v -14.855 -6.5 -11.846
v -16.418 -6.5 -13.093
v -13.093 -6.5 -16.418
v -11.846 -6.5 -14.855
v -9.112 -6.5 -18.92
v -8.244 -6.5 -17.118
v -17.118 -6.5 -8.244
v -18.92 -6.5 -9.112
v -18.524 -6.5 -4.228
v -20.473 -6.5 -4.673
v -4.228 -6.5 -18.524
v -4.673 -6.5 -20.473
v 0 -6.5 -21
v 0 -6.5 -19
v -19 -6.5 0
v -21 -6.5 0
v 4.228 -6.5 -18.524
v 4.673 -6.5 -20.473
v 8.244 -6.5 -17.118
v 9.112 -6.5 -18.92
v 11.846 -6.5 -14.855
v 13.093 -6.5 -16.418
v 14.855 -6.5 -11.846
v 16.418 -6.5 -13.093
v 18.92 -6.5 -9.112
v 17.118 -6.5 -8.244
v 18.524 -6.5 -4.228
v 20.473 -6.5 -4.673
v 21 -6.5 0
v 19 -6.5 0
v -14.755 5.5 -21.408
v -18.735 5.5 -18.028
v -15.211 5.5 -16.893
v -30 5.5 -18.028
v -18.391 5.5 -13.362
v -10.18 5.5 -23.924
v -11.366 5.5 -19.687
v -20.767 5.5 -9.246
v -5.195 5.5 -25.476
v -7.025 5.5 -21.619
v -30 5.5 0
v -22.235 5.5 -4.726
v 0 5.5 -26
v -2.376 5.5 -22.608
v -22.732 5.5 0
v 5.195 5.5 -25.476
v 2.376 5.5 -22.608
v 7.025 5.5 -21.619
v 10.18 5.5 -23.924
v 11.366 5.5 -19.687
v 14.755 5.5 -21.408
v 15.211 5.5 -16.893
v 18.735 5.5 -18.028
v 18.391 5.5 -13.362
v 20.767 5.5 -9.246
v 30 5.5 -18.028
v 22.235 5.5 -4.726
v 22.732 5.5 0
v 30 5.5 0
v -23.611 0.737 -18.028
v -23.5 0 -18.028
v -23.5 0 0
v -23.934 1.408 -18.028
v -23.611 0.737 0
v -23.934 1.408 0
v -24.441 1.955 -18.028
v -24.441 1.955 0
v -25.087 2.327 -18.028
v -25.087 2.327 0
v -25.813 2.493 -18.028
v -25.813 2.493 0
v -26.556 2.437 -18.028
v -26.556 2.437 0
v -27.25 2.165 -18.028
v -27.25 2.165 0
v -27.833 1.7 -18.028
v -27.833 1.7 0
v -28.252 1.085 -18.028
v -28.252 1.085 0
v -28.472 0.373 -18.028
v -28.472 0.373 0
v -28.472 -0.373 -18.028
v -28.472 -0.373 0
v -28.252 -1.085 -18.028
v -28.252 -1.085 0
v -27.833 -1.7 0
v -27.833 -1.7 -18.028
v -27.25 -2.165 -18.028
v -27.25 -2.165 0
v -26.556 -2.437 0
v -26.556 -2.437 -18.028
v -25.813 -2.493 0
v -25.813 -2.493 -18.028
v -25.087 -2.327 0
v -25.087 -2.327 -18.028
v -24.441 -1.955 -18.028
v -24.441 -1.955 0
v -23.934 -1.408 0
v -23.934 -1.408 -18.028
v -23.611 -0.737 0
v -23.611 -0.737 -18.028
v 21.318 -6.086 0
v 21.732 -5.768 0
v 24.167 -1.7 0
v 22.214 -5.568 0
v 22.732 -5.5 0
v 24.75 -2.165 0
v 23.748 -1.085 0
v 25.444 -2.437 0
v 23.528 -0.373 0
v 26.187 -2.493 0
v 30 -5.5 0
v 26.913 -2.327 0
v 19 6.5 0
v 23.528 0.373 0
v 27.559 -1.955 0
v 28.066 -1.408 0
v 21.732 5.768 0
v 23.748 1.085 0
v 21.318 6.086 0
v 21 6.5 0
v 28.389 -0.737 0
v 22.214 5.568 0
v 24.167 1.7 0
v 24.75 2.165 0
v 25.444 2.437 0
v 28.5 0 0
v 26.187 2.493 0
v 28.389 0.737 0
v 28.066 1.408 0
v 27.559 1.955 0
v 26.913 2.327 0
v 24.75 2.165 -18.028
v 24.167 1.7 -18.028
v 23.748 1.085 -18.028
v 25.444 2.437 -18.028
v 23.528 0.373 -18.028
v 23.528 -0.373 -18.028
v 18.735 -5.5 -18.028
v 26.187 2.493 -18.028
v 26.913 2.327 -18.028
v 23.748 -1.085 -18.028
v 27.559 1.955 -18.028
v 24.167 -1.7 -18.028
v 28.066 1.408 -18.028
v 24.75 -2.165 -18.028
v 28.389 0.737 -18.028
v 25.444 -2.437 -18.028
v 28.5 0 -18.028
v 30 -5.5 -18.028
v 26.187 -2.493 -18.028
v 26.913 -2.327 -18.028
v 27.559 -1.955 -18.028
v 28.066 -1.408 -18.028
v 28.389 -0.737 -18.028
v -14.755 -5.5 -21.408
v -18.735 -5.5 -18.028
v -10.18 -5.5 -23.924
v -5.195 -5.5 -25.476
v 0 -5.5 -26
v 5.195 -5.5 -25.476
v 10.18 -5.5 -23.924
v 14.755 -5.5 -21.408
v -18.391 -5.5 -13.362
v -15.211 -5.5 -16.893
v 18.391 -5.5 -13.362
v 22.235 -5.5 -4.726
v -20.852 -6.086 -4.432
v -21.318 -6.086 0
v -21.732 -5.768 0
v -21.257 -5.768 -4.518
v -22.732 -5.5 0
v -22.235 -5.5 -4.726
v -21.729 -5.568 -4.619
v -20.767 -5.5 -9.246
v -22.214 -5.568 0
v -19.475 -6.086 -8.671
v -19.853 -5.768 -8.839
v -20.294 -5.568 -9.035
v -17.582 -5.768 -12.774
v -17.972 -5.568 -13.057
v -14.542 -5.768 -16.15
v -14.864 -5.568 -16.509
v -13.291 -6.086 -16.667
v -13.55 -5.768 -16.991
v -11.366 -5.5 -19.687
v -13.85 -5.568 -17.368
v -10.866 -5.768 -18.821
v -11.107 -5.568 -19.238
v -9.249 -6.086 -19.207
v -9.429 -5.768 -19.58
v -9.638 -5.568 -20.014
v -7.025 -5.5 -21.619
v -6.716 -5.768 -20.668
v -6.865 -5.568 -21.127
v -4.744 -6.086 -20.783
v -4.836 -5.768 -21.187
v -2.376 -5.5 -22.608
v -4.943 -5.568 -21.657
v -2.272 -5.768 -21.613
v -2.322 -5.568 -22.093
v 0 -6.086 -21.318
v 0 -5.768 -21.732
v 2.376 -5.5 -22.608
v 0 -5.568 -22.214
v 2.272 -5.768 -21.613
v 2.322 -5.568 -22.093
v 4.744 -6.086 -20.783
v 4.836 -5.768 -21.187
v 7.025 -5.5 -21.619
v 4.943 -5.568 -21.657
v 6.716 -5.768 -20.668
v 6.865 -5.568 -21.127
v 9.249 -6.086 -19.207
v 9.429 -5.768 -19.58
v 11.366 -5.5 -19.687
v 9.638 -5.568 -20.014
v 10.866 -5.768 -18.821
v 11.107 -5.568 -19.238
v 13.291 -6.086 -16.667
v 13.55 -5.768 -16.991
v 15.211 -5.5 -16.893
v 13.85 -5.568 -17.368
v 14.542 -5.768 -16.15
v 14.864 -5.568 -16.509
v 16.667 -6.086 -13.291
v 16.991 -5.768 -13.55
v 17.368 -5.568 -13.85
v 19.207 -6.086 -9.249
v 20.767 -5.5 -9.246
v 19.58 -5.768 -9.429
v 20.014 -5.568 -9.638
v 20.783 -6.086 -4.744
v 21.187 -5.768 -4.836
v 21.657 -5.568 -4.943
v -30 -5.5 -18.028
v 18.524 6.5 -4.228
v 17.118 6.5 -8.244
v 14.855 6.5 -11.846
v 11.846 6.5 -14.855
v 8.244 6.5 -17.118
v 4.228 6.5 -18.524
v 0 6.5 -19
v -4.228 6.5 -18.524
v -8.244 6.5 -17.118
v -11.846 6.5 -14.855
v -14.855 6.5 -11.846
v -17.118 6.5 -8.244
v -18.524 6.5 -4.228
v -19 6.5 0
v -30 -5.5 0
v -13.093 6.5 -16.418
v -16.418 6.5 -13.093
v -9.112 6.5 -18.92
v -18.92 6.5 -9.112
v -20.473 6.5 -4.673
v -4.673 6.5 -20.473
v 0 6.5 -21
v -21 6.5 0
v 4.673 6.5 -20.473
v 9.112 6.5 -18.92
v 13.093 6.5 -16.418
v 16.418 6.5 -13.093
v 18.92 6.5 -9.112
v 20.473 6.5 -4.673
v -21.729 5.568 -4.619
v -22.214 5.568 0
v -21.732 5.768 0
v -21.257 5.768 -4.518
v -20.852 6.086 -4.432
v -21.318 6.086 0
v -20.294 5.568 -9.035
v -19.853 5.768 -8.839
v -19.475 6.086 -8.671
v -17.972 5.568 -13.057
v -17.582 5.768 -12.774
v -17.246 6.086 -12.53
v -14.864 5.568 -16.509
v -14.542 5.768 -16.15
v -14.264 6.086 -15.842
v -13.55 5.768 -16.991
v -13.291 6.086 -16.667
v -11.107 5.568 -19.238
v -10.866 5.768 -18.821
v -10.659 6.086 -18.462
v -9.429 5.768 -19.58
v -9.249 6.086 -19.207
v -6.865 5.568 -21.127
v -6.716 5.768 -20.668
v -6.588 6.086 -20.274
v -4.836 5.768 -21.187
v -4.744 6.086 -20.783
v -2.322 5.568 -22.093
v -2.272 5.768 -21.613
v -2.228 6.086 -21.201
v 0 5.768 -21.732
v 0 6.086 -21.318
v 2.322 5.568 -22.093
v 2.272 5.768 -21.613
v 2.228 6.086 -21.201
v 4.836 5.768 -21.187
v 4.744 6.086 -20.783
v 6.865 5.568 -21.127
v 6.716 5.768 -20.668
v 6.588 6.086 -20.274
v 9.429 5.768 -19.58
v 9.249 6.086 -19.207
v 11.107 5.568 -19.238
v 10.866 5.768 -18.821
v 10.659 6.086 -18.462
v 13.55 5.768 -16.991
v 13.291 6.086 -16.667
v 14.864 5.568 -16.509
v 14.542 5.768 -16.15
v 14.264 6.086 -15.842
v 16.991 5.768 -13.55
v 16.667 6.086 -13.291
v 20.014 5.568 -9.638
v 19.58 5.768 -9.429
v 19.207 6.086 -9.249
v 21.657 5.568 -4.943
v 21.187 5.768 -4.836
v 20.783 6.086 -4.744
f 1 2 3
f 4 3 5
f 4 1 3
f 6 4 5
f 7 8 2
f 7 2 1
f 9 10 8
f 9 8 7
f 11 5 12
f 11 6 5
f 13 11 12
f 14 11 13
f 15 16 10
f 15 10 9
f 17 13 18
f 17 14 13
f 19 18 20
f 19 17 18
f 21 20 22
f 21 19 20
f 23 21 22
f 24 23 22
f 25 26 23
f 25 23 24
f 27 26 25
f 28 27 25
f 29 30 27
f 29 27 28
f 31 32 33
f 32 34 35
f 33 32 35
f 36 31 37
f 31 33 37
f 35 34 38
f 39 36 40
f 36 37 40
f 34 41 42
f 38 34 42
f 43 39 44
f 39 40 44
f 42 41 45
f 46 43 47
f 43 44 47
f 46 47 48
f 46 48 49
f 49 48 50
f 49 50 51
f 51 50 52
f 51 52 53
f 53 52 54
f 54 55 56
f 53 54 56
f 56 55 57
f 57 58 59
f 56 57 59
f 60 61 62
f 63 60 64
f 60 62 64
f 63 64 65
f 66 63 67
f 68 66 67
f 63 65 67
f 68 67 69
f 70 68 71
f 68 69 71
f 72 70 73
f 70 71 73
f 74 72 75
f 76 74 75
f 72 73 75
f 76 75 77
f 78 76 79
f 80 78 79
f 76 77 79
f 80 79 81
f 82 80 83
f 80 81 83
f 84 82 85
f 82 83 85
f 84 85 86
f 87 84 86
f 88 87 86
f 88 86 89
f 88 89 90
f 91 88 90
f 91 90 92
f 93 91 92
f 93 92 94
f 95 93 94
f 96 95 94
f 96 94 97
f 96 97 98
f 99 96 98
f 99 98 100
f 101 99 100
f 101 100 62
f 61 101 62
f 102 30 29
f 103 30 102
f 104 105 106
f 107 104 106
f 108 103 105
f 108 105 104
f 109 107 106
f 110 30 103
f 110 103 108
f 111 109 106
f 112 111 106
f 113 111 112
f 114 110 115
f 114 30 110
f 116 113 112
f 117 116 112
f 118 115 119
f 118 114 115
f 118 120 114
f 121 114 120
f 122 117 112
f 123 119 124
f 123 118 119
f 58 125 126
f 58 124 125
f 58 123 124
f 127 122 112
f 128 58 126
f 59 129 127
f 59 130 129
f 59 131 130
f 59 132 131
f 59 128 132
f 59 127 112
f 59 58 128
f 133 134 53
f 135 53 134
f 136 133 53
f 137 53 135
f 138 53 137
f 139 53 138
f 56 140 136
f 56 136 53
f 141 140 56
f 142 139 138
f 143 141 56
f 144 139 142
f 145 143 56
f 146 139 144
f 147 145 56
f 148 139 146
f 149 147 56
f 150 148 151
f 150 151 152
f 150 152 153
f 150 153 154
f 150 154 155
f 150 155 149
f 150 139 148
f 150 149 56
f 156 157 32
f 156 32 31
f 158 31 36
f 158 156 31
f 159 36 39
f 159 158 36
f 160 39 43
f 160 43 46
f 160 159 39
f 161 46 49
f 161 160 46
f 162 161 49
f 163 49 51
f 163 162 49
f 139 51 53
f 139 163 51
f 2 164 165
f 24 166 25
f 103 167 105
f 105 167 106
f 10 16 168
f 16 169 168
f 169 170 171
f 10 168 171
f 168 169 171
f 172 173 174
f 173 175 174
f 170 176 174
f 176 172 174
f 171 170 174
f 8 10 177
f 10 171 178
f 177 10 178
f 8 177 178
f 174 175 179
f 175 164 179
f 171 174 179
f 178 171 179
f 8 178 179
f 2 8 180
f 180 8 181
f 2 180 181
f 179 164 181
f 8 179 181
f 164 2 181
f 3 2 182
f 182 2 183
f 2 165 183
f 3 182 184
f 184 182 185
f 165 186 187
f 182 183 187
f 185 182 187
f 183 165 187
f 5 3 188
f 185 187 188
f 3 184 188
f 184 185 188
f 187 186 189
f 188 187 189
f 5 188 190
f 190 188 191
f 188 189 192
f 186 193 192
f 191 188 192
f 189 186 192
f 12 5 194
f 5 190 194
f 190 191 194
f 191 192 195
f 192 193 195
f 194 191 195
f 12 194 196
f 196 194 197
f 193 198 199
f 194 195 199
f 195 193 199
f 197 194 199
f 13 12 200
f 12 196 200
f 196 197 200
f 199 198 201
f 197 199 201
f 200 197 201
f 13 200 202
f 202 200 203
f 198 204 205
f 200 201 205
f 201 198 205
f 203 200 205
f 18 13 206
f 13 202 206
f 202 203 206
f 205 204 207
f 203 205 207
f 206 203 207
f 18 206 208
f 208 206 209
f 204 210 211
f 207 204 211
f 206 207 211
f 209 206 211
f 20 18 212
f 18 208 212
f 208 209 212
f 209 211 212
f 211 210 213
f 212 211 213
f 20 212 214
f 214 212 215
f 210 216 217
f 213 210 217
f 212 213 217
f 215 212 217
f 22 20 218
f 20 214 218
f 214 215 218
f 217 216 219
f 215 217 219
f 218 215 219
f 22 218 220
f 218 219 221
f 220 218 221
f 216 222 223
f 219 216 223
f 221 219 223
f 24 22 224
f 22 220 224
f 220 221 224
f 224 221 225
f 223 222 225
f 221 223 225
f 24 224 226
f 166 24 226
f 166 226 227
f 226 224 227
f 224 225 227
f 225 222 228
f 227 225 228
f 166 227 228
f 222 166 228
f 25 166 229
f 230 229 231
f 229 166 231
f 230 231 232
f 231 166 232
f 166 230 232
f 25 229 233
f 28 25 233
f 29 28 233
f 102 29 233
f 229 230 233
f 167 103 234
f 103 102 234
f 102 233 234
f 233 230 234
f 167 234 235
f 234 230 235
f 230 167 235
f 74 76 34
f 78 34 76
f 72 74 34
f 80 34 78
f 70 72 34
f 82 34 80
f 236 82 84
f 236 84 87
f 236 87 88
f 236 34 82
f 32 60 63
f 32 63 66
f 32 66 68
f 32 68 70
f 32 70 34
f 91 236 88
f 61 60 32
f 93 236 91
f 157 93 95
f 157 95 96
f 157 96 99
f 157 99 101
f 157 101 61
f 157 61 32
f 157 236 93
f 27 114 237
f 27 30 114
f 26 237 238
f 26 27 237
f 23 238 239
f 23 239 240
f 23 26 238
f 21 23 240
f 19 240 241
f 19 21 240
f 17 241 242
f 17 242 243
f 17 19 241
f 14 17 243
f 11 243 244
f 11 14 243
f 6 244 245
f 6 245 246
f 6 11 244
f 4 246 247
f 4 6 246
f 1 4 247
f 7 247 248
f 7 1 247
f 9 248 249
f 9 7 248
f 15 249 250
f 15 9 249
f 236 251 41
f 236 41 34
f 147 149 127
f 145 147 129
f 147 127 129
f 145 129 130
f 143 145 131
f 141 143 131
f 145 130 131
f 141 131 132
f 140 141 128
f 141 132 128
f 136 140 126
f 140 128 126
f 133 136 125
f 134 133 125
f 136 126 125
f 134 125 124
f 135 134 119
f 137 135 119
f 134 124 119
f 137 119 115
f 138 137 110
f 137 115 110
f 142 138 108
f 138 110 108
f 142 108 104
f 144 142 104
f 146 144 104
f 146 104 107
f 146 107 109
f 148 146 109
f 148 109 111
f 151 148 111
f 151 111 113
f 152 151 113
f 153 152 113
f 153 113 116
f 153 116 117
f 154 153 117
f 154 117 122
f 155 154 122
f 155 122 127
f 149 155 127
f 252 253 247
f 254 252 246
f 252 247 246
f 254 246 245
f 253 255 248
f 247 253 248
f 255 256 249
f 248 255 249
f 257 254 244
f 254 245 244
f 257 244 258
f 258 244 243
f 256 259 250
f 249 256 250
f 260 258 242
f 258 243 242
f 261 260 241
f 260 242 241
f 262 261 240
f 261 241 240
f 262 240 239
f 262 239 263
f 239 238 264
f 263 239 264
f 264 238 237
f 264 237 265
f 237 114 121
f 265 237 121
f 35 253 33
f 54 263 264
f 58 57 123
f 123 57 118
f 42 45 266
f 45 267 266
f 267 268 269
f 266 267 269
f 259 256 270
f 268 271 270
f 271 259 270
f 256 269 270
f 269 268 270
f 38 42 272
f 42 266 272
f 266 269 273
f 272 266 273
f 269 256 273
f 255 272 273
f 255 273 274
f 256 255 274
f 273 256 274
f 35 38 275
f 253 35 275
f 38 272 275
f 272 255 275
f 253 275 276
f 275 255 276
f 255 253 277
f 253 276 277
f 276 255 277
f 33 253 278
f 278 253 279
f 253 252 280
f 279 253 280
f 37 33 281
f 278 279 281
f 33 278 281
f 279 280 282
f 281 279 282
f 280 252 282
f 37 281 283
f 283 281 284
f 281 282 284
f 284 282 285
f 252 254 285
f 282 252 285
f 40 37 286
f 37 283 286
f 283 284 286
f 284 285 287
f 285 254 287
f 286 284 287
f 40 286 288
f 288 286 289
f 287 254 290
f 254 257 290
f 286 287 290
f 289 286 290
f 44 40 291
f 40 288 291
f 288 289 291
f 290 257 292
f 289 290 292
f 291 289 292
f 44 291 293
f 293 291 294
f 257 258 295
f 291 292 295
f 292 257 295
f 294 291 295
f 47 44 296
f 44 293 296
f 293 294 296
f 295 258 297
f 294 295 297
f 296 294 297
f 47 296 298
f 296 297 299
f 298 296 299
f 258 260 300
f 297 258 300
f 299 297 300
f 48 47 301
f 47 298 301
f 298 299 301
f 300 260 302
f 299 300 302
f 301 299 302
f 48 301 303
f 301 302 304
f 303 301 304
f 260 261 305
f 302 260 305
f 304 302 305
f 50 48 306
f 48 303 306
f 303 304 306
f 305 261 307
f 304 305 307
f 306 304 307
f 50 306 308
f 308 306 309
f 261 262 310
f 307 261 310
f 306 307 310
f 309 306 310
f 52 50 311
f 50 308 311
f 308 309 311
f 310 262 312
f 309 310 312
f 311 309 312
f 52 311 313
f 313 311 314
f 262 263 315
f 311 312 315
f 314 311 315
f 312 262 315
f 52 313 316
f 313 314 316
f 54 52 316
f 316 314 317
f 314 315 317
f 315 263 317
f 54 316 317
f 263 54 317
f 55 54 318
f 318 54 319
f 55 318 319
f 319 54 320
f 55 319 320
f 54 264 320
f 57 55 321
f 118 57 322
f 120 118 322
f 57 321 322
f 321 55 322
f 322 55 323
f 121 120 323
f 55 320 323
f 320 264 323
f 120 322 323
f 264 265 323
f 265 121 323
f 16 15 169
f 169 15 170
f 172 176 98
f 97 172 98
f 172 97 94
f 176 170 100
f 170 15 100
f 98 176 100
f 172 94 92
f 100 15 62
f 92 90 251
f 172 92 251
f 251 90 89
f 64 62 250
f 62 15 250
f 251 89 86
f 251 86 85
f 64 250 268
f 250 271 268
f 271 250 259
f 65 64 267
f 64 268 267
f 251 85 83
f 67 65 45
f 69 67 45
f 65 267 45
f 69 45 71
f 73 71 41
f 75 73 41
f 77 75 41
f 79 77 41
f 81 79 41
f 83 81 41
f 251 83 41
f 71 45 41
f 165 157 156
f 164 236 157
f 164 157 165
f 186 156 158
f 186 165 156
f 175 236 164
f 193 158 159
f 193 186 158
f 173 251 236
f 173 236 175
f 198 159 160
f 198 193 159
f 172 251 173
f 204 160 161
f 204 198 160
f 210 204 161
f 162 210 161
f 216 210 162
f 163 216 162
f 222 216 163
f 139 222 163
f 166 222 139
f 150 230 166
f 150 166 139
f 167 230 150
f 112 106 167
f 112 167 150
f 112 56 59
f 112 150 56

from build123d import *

# Parameters (mm, degrees)
F1_DEPTH    = 5.5
F2_DEPTH    = 6.5
F3_T2_ANGLE = 180
F3_T4_ANGLE = 180
F4_R        = 2.5
F5_DEPTH    = 25.4


# Not quite as in the source:
# - a fillet or chamfer that OpenCascade refuses, or shapes differently, is made with other operations: its cross-section is extruded or revolved along the edge and cut away or added


with BuildPart() as f1:
    # F0 (on Front) → F1 (new body, symmetric)
    with BuildSketch(Plane.XZ):
        with BuildLine():
            ThreePointArc((19, 0), (0, -19), (-19, 0))
            Line((-19, 0), (-21, 0))
            ThreePointArc((-21, 0), (0, -21), (21, 0))
            Line((21, 0), (19, 0))
        make_face()
        with BuildLine():
            ThreePointArc((21, 0), (0, -21), (-21, 0))
            Line((-21, 0), (-30, 0))
            Line((-30, 0), (-30, -18.0277563773))
            Line((-30, -18.0277563773), (-18.7349939952, -18.0277563773))
            ThreePointArc((-18.7349939952, -18.0277563773), (0, -26), (18.7349939952, -18.0277563773))
            Line((18.7349939952, -18.0277563773), (30, -18.0277563773))
            Line((30, -18.0277563773), (30, 0))
            Line((30, 0), (21, 0))
        make_face()
    extrude(amount=F1_DEPTH, both=True)

    # F0 (on Front) → F2 (join, symmetric)
    with BuildSketch(Plane.XZ):
        with BuildLine():
            ThreePointArc((19, 0), (0, -19), (-19, 0))
            Line((-19, 0), (-21, 0))
            ThreePointArc((-21, 0), (0, -21), (21, 0))
            Line((21, 0), (19, 0))
        make_face()
    extrude(amount=F2_DEPTH, both=True)

    # F3: fillet of radius 2 on 2 edges, made by hand

    # F3_s1 → F3_t2 (revolve)
    with BuildSketch(Plane.XY):
        with BuildLine():
            ThreePointArc((-22.7320508076, 5.5), (-21.7320508076, 5.7679491924), (-21, 6.5))
            Line((-21, 6.5), (-21, 5.5))
            Line((-21, 5.5), (-22.7320508076, 5.5))
        make_face()
    revolve(axis=Axis((0, 5.5, 0), (0, -1, 0)), revolution_arc=F3_T2_ANGLE)

    # F3_s3 → F3_t4 (revolve)
    with BuildSketch(Plane.XY):
        with BuildLine():
            ThreePointArc((-21, -6.5), (-21.7320508076, -5.7679491924), (-22.7320508076, -5.5))
            Line((-22.7320508076, -5.5), (-21, -5.5))
            Line((-21, -5.5), (-21, -6.5))
        make_face()
    revolve(axis=Axis((0, -5.5, 0), (0, -1, 0)), revolution_arc=F3_T4_ANGLE)

    # F4 (on Top) → F5 (cut)
    with BuildSketch(Plane.XY):
        with Locations((-26, 0)):
            Circle(F4_R)
        with Locations((26, 0)):
            Circle(F4_R)
    extrude(amount=-F5_DEPTH, mode=Mode.SUBTRACT)


solid = f1.part
